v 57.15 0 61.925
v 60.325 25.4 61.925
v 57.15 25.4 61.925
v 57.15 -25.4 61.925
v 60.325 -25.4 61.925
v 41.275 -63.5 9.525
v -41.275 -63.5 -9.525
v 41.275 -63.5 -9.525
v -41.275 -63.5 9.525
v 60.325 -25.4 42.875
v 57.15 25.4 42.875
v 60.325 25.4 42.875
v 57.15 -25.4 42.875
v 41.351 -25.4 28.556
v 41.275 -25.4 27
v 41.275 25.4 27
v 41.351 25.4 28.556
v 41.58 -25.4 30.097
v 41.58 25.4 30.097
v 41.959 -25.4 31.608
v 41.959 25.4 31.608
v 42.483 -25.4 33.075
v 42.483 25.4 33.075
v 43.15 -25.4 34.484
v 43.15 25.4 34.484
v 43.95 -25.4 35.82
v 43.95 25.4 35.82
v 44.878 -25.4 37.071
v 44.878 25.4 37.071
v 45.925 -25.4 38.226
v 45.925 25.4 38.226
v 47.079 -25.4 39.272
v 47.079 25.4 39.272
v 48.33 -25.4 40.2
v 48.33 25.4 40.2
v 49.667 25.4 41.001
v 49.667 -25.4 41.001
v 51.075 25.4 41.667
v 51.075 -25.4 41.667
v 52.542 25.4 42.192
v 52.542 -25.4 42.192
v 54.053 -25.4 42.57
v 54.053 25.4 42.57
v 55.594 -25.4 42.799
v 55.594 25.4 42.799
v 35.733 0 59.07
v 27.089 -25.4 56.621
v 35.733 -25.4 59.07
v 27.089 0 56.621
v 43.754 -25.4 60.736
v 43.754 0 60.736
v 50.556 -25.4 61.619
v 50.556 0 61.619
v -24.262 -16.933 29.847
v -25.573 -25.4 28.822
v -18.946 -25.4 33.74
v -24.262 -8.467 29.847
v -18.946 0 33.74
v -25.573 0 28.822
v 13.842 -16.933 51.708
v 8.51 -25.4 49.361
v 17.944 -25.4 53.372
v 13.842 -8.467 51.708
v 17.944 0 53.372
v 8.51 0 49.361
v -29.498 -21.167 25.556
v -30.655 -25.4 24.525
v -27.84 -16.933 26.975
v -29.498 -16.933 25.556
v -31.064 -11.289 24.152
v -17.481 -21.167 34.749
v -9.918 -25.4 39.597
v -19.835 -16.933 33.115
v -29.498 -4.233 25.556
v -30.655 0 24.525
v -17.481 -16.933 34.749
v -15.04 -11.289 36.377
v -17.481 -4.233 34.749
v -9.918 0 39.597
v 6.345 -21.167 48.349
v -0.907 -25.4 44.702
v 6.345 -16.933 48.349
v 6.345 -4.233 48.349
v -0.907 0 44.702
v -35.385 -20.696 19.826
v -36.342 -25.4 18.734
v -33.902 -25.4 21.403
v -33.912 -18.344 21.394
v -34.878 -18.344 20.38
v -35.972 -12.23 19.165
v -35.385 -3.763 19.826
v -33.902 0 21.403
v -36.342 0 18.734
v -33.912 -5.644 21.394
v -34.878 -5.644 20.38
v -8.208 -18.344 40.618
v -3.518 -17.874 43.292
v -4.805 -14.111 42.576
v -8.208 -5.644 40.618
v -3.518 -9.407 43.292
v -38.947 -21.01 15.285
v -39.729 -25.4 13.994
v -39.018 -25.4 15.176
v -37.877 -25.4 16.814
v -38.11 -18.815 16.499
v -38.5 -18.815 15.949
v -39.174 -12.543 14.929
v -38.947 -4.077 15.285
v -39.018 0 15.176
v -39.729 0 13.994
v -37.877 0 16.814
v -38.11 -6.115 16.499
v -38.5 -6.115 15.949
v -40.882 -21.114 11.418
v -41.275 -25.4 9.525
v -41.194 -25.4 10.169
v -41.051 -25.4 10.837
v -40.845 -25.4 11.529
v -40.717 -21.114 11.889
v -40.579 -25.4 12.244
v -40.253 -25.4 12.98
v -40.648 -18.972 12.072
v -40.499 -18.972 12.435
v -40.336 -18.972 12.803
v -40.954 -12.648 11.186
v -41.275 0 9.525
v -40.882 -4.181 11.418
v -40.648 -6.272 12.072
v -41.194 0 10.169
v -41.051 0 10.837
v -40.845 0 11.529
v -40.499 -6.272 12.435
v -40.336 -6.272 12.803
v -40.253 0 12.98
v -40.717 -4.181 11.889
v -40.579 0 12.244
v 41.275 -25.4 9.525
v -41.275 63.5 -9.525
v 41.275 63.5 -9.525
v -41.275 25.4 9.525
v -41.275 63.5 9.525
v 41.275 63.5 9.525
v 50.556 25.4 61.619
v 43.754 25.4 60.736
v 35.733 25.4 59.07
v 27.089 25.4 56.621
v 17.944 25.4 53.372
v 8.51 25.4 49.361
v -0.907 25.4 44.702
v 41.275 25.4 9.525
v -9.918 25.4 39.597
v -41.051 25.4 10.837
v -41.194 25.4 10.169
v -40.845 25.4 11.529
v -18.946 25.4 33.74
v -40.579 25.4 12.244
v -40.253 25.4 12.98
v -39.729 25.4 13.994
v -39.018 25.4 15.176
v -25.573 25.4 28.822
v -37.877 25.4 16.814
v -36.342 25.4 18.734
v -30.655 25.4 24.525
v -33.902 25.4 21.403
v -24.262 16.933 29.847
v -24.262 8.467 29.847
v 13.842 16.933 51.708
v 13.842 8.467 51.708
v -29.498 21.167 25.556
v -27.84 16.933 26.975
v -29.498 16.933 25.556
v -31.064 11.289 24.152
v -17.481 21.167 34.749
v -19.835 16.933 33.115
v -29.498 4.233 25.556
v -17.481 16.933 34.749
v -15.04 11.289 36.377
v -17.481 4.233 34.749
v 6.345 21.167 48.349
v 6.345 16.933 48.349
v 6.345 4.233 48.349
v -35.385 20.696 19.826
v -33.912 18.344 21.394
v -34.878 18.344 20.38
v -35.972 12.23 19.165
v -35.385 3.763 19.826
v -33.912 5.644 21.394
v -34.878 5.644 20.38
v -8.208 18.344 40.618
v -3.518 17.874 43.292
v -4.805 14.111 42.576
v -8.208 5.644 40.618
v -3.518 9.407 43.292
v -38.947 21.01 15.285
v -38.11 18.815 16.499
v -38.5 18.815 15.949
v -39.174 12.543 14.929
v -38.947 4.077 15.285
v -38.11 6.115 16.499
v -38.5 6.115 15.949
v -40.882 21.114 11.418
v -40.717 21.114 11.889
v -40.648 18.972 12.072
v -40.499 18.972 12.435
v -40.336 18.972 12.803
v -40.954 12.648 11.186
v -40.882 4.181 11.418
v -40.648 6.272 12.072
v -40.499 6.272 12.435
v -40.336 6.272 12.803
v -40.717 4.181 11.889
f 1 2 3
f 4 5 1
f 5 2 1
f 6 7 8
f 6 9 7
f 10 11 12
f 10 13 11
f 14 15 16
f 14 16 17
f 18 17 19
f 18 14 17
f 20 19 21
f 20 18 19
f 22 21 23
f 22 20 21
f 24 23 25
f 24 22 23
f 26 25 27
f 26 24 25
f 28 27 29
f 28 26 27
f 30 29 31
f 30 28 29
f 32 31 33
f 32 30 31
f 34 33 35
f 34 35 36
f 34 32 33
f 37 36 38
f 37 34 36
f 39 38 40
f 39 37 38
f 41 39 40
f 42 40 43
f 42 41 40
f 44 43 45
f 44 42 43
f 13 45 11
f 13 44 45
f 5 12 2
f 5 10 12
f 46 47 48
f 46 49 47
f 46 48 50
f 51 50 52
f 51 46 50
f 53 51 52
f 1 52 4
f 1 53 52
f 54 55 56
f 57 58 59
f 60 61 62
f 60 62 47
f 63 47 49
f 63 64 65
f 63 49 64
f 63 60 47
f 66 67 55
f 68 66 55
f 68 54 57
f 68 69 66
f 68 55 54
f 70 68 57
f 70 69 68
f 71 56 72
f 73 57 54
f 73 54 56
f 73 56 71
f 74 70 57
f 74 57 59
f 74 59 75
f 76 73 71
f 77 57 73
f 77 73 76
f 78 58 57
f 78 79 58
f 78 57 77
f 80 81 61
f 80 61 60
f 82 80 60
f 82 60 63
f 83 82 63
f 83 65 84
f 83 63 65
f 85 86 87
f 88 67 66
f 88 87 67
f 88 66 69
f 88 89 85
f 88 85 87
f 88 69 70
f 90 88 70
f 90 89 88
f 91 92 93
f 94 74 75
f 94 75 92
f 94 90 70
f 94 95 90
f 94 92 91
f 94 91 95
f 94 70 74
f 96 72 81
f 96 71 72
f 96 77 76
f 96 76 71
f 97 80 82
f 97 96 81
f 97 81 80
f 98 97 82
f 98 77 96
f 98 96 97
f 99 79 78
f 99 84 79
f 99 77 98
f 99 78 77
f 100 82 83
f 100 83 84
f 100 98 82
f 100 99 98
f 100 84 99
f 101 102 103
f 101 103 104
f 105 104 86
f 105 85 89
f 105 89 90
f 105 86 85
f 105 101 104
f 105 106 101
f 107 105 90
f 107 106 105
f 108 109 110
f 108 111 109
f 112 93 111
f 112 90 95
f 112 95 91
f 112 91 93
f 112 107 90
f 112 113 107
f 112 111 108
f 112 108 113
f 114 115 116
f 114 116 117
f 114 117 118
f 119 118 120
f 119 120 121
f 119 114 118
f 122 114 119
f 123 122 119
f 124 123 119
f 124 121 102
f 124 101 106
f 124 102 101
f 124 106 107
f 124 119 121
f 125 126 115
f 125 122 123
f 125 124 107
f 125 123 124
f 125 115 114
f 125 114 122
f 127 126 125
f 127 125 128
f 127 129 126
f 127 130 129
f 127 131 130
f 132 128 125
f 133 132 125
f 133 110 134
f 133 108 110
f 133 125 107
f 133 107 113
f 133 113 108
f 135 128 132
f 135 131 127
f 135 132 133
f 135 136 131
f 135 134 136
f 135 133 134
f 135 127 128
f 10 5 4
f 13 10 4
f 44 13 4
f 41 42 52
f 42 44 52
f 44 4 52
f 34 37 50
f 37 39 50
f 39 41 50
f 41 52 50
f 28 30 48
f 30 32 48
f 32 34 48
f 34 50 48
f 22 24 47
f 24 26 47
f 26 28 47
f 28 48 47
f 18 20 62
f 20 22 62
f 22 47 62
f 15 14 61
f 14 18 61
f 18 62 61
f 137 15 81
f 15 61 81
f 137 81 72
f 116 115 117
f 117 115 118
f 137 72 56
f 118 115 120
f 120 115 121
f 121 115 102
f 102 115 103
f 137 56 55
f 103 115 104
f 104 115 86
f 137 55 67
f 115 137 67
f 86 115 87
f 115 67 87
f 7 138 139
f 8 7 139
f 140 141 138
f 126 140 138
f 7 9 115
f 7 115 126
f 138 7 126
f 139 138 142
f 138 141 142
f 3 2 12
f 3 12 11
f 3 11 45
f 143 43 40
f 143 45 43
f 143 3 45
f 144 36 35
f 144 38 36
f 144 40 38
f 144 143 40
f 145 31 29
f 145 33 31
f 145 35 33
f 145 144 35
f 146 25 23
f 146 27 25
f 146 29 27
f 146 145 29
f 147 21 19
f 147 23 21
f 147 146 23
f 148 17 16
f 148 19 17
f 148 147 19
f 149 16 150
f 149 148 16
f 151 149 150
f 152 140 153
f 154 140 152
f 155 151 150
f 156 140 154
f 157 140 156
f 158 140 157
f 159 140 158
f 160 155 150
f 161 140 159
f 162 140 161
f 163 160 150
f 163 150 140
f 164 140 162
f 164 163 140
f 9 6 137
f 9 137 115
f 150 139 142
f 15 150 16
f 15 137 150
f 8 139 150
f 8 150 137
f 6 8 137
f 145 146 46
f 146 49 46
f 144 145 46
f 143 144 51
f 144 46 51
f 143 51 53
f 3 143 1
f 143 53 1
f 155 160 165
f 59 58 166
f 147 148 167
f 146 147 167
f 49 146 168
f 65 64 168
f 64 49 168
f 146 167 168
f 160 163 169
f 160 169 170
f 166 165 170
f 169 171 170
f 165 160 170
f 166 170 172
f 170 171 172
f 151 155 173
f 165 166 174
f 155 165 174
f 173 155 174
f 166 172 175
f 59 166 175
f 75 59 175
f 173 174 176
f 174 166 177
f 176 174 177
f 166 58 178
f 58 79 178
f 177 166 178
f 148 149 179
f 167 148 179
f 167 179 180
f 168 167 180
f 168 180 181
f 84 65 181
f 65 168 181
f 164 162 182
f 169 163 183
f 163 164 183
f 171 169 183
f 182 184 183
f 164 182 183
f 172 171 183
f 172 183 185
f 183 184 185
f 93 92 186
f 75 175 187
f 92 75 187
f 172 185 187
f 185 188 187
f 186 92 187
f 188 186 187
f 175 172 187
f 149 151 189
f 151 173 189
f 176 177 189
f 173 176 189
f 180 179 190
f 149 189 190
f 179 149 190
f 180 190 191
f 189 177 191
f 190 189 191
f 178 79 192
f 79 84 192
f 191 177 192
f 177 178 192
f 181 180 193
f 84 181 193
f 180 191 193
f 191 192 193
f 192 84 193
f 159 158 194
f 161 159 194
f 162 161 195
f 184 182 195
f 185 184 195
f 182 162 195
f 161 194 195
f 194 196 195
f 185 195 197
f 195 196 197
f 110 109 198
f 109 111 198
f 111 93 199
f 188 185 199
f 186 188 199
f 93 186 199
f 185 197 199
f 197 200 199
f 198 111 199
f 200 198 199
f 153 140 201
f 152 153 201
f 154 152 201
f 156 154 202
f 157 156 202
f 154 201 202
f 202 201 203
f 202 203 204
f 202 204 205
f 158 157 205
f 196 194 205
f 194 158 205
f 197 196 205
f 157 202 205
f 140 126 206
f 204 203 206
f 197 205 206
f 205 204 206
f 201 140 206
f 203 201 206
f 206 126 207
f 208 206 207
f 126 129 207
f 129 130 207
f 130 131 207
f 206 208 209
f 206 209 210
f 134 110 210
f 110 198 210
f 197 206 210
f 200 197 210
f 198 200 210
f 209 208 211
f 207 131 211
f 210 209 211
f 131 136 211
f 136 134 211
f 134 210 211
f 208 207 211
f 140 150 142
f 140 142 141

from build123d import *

# Parameters (mm, degrees)
F1_DEPTH = 63.5
F2_DEPTH = 25.4


with BuildPart() as f1:
    # F0 (on Front) → F1 (new body, symmetric)
    with BuildSketch(Plane.XZ):
        Polygon((-41.275, -9.525), (41.275, -9.525), (41.275, 9.525), (22.225, 9.525), (-41.275, 9.525), align=None)
    extrude(amount=F1_DEPTH, both=True)

    # F0 (on Front) → F2 (join, symmetric)
    with BuildSketch(Plane.XZ):
        with BuildLine():
            add(Edge.make_bspline(
                [(-41.275, 9.525), (-40.101912, 24.682952), (16.535287, 61.9252), (57.15, 61.9252)],
                knots=[0, 0, 0, 0, 111.504536, 111.504536, 111.504536, 111.504536], degree=3))
            Line((-41.275, 9.525), (22.225, 9.525))
            Line((22.225, 9.525), (22.225, 27.0002))
            ThreePointArc((22.225, 27.0002), (32.454296, 51.695904), (57.15, 61.9252))
        make_face()
        with BuildLine():
            Line((22.225, 9.525), (41.275, 9.525))
            Line((41.275, 9.525), (41.275, 27.0002))
            ThreePointArc((41.275, 27.0002), (45.92468, 38.22552), (57.15, 42.8752))
            Line((57.15, 42.8752), (60.325, 42.8752))
            Line((60.325, 42.8752), (60.325, 61.9252))
            Line((60.325, 61.9252), (57.15, 61.9252))
            ThreePointArc((57.15, 61.9252), (32.454296, 51.695904), (22.225, 27.0002))
            Line((22.225, 27.0002), (22.225, 9.525))
        make_face()
    extrude(amount=F2_DEPTH, both=True)


solid = f1.part
